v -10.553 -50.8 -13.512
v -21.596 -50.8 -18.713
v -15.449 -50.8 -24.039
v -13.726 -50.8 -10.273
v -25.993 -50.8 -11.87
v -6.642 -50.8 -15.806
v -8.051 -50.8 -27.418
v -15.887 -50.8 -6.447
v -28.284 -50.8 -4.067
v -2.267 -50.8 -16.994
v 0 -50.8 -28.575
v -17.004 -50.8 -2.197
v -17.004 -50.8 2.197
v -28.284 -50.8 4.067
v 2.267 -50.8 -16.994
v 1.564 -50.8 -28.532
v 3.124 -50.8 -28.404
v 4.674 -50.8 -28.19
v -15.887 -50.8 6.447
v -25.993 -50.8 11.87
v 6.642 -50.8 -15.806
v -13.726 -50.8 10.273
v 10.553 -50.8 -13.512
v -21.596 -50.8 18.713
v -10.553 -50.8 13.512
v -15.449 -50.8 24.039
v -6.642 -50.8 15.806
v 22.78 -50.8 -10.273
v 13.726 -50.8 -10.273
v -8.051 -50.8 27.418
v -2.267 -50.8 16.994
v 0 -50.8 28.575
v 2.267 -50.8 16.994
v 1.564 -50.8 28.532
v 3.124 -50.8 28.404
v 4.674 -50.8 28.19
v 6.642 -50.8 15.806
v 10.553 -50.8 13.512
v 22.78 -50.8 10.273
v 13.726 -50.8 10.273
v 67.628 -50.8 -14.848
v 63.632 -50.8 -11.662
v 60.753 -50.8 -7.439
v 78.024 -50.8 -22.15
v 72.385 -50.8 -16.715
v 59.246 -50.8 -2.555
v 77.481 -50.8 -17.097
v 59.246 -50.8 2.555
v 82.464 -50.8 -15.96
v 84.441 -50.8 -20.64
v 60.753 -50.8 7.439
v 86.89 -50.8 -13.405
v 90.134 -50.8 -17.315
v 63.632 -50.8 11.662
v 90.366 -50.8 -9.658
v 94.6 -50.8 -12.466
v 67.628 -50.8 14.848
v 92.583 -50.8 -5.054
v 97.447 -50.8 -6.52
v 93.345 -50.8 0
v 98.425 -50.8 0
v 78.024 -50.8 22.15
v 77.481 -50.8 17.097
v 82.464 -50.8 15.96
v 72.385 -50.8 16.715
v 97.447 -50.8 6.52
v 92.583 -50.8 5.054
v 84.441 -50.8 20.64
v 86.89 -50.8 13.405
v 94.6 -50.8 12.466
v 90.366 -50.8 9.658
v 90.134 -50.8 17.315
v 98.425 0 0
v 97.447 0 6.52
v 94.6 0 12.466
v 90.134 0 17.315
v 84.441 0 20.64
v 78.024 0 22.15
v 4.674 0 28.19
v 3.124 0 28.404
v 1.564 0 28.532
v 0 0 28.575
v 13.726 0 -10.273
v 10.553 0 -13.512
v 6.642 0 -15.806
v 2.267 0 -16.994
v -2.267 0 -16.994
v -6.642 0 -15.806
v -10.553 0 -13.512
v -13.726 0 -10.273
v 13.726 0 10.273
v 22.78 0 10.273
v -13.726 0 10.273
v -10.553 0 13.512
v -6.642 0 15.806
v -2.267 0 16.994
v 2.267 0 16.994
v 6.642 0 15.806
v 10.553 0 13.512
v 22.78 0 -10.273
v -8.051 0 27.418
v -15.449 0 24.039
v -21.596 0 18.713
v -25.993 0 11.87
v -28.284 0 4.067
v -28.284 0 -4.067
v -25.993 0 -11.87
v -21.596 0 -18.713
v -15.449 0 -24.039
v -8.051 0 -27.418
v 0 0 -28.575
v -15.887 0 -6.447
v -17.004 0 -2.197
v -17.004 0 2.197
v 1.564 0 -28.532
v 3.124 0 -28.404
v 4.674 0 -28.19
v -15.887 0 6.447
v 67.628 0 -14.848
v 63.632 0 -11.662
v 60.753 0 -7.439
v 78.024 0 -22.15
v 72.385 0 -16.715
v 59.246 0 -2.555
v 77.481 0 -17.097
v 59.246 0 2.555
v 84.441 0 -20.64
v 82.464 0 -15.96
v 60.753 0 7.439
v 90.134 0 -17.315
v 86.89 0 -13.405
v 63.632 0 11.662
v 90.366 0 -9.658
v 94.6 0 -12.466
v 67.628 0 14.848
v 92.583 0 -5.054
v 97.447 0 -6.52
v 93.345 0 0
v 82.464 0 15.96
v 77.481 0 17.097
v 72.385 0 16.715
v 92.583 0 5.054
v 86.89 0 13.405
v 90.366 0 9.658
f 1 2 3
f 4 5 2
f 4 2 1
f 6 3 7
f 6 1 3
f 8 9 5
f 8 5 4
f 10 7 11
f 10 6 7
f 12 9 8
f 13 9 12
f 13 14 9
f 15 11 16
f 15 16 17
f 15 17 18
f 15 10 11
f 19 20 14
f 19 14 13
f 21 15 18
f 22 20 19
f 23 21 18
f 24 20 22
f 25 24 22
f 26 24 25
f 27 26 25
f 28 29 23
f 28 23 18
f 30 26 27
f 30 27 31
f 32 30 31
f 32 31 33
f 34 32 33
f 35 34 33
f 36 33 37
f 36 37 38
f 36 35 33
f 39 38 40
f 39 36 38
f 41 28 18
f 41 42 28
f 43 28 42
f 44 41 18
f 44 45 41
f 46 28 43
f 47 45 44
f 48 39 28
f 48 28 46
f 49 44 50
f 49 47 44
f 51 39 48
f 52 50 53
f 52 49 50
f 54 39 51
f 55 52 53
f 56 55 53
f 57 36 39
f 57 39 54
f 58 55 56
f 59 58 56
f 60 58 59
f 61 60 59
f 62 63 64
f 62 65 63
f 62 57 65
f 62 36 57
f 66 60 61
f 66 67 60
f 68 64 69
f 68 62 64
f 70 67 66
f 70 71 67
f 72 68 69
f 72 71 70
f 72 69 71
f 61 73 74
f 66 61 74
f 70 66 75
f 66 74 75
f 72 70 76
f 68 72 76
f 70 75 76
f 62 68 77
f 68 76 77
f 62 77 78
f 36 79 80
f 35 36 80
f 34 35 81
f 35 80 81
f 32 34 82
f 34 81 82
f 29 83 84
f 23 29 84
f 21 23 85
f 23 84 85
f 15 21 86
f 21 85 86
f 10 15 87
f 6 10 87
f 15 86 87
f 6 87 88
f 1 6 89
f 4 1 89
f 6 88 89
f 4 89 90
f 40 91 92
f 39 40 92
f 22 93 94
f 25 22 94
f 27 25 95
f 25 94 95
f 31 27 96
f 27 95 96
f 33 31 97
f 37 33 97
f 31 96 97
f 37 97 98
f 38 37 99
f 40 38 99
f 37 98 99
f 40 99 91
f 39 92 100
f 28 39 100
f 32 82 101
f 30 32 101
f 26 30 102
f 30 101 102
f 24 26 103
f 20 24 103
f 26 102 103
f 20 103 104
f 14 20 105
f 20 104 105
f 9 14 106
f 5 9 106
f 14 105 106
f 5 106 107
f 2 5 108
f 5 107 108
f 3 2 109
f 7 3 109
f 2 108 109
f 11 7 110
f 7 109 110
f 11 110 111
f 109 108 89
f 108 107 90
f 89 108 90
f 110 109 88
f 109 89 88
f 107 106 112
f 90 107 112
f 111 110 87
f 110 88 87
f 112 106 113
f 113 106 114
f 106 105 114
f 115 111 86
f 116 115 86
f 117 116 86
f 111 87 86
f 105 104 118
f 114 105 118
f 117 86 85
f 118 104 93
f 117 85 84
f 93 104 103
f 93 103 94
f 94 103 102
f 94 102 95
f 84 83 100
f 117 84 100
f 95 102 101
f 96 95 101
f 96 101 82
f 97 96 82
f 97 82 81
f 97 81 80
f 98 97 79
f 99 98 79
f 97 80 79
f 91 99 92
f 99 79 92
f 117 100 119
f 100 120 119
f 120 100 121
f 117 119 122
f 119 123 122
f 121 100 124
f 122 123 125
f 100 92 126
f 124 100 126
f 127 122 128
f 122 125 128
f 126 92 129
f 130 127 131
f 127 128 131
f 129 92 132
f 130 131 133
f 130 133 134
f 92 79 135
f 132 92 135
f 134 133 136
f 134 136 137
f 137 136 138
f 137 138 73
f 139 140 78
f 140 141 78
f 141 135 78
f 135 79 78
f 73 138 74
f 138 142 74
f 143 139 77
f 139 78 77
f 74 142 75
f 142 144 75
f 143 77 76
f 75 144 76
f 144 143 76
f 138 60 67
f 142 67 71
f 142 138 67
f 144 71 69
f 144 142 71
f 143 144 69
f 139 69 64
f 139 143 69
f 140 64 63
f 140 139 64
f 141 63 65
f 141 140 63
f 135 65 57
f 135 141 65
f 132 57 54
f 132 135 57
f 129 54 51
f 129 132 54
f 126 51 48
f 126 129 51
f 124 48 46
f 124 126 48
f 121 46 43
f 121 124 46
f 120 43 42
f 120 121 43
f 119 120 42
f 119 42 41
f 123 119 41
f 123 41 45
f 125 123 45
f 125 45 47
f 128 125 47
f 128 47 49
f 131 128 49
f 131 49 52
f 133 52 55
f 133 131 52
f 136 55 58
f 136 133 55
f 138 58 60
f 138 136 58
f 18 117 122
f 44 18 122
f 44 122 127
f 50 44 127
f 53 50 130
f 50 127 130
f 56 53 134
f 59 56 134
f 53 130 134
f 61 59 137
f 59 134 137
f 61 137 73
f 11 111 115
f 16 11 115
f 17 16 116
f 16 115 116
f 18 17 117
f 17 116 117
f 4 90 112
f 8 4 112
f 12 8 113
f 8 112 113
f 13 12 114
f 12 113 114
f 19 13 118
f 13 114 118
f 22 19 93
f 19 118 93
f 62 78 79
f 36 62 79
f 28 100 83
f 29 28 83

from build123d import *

# Parameters (mm, degrees)
F0_R     = 17.145
F1_DEPTH = 50.8


# Not quite as in the source:
# - a feature names something its author has since deleted; it is built from what else it names


with BuildPart() as f1:
    # F0 (on Front) → F1 (new body)
    with BuildSketch(Plane.XZ):
        with BuildLine():
            Line((4.6743845872, 28.1900825421), (0, 28.575))
            ThreePointArc((0, 28.575), (-28.575, 0), (0, -28.575))
            Line((0, -28.575), (4.6743845872, -28.1900825421))
            ThreePointArc((4.6743845872, -28.1900825421), (21.7956551241, -18.4791786265), (28.575, 0))
            ThreePointArc((28.575, 0), (21.7956551241, 18.4791786265), (4.6743845872, 28.1900825421))
        make_face()
        with BuildLine():
            ThreePointArc((-13.7262649311, -10.27329918), (-17.145, 0), (-13.7262649311, 10.27329918))
            ThreePointArc((-13.7262649311, 10.27329918), (0, 17.145), (13.7262649311, 10.27329918))
            Line((13.7262649311, 10.27329918), (22.7799285203, 10.27329918))
            Line((22.7799285203, 10.27329918), (22.7799285203, -10.27329918))
            Line((22.7799285203, -10.27329918), (13.7262649311, -10.27329918))
            ThreePointArc((13.7262649311, -10.27329918), (0, -17.145), (-13.7262649311, -10.27329918))
        make_face(mode=Mode.SUBTRACT)
        with BuildLine():
            ThreePointArc((4.6743845872, 28.1900825421), (2.3451030211, 28.4786080562), (0, 28.575))
            Line((0, 28.575), (4.6743845872, 28.1900825421))
        make_face()
        with BuildLine():
            Line((4.6743845872, -28.1900825421), (0, -28.575))
            ThreePointArc((0, -28.575), (2.3451030211, -28.4786080562), (4.6743845872, -28.1900825421))
        make_face()
        with BuildLine():
            Line((78.0239690164, 22.1500284882), (4.6743845872, 28.1900825421))
            ThreePointArc((4.6743845872, 28.1900825421), (21.7956551241, 18.4791786265), (28.575, 0))
            ThreePointArc((28.575, 0), (21.7956551241, -18.4791786265), (4.6743845872, -28.1900825421))
            Line((4.6743845872, -28.1900825421), (78.0239690164, -22.1500284882))
            ThreePointArc((78.0239690164, -22.1500284882), (53.975, 0), (78.0239690164, 22.1500284882))
        make_face()
        with BuildLine():
            ThreePointArc((98.425, 0), (92.5476043564, 15.0567744489), (78.0239690164, 22.1500284882))
            ThreePointArc((78.0239690164, 22.1500284882), (53.975, 0), (78.0239690164, -22.1500284882))
            ThreePointArc((78.0239690164, -22.1500284882), (92.5476043564, -15.0567744489), (98.425, 0))
        make_face()
        with Locations((76.2, 0)):
            Circle(F0_R, mode=Mode.SUBTRACT)
    extrude(amount=F1_DEPTH)


solid = f1.part
